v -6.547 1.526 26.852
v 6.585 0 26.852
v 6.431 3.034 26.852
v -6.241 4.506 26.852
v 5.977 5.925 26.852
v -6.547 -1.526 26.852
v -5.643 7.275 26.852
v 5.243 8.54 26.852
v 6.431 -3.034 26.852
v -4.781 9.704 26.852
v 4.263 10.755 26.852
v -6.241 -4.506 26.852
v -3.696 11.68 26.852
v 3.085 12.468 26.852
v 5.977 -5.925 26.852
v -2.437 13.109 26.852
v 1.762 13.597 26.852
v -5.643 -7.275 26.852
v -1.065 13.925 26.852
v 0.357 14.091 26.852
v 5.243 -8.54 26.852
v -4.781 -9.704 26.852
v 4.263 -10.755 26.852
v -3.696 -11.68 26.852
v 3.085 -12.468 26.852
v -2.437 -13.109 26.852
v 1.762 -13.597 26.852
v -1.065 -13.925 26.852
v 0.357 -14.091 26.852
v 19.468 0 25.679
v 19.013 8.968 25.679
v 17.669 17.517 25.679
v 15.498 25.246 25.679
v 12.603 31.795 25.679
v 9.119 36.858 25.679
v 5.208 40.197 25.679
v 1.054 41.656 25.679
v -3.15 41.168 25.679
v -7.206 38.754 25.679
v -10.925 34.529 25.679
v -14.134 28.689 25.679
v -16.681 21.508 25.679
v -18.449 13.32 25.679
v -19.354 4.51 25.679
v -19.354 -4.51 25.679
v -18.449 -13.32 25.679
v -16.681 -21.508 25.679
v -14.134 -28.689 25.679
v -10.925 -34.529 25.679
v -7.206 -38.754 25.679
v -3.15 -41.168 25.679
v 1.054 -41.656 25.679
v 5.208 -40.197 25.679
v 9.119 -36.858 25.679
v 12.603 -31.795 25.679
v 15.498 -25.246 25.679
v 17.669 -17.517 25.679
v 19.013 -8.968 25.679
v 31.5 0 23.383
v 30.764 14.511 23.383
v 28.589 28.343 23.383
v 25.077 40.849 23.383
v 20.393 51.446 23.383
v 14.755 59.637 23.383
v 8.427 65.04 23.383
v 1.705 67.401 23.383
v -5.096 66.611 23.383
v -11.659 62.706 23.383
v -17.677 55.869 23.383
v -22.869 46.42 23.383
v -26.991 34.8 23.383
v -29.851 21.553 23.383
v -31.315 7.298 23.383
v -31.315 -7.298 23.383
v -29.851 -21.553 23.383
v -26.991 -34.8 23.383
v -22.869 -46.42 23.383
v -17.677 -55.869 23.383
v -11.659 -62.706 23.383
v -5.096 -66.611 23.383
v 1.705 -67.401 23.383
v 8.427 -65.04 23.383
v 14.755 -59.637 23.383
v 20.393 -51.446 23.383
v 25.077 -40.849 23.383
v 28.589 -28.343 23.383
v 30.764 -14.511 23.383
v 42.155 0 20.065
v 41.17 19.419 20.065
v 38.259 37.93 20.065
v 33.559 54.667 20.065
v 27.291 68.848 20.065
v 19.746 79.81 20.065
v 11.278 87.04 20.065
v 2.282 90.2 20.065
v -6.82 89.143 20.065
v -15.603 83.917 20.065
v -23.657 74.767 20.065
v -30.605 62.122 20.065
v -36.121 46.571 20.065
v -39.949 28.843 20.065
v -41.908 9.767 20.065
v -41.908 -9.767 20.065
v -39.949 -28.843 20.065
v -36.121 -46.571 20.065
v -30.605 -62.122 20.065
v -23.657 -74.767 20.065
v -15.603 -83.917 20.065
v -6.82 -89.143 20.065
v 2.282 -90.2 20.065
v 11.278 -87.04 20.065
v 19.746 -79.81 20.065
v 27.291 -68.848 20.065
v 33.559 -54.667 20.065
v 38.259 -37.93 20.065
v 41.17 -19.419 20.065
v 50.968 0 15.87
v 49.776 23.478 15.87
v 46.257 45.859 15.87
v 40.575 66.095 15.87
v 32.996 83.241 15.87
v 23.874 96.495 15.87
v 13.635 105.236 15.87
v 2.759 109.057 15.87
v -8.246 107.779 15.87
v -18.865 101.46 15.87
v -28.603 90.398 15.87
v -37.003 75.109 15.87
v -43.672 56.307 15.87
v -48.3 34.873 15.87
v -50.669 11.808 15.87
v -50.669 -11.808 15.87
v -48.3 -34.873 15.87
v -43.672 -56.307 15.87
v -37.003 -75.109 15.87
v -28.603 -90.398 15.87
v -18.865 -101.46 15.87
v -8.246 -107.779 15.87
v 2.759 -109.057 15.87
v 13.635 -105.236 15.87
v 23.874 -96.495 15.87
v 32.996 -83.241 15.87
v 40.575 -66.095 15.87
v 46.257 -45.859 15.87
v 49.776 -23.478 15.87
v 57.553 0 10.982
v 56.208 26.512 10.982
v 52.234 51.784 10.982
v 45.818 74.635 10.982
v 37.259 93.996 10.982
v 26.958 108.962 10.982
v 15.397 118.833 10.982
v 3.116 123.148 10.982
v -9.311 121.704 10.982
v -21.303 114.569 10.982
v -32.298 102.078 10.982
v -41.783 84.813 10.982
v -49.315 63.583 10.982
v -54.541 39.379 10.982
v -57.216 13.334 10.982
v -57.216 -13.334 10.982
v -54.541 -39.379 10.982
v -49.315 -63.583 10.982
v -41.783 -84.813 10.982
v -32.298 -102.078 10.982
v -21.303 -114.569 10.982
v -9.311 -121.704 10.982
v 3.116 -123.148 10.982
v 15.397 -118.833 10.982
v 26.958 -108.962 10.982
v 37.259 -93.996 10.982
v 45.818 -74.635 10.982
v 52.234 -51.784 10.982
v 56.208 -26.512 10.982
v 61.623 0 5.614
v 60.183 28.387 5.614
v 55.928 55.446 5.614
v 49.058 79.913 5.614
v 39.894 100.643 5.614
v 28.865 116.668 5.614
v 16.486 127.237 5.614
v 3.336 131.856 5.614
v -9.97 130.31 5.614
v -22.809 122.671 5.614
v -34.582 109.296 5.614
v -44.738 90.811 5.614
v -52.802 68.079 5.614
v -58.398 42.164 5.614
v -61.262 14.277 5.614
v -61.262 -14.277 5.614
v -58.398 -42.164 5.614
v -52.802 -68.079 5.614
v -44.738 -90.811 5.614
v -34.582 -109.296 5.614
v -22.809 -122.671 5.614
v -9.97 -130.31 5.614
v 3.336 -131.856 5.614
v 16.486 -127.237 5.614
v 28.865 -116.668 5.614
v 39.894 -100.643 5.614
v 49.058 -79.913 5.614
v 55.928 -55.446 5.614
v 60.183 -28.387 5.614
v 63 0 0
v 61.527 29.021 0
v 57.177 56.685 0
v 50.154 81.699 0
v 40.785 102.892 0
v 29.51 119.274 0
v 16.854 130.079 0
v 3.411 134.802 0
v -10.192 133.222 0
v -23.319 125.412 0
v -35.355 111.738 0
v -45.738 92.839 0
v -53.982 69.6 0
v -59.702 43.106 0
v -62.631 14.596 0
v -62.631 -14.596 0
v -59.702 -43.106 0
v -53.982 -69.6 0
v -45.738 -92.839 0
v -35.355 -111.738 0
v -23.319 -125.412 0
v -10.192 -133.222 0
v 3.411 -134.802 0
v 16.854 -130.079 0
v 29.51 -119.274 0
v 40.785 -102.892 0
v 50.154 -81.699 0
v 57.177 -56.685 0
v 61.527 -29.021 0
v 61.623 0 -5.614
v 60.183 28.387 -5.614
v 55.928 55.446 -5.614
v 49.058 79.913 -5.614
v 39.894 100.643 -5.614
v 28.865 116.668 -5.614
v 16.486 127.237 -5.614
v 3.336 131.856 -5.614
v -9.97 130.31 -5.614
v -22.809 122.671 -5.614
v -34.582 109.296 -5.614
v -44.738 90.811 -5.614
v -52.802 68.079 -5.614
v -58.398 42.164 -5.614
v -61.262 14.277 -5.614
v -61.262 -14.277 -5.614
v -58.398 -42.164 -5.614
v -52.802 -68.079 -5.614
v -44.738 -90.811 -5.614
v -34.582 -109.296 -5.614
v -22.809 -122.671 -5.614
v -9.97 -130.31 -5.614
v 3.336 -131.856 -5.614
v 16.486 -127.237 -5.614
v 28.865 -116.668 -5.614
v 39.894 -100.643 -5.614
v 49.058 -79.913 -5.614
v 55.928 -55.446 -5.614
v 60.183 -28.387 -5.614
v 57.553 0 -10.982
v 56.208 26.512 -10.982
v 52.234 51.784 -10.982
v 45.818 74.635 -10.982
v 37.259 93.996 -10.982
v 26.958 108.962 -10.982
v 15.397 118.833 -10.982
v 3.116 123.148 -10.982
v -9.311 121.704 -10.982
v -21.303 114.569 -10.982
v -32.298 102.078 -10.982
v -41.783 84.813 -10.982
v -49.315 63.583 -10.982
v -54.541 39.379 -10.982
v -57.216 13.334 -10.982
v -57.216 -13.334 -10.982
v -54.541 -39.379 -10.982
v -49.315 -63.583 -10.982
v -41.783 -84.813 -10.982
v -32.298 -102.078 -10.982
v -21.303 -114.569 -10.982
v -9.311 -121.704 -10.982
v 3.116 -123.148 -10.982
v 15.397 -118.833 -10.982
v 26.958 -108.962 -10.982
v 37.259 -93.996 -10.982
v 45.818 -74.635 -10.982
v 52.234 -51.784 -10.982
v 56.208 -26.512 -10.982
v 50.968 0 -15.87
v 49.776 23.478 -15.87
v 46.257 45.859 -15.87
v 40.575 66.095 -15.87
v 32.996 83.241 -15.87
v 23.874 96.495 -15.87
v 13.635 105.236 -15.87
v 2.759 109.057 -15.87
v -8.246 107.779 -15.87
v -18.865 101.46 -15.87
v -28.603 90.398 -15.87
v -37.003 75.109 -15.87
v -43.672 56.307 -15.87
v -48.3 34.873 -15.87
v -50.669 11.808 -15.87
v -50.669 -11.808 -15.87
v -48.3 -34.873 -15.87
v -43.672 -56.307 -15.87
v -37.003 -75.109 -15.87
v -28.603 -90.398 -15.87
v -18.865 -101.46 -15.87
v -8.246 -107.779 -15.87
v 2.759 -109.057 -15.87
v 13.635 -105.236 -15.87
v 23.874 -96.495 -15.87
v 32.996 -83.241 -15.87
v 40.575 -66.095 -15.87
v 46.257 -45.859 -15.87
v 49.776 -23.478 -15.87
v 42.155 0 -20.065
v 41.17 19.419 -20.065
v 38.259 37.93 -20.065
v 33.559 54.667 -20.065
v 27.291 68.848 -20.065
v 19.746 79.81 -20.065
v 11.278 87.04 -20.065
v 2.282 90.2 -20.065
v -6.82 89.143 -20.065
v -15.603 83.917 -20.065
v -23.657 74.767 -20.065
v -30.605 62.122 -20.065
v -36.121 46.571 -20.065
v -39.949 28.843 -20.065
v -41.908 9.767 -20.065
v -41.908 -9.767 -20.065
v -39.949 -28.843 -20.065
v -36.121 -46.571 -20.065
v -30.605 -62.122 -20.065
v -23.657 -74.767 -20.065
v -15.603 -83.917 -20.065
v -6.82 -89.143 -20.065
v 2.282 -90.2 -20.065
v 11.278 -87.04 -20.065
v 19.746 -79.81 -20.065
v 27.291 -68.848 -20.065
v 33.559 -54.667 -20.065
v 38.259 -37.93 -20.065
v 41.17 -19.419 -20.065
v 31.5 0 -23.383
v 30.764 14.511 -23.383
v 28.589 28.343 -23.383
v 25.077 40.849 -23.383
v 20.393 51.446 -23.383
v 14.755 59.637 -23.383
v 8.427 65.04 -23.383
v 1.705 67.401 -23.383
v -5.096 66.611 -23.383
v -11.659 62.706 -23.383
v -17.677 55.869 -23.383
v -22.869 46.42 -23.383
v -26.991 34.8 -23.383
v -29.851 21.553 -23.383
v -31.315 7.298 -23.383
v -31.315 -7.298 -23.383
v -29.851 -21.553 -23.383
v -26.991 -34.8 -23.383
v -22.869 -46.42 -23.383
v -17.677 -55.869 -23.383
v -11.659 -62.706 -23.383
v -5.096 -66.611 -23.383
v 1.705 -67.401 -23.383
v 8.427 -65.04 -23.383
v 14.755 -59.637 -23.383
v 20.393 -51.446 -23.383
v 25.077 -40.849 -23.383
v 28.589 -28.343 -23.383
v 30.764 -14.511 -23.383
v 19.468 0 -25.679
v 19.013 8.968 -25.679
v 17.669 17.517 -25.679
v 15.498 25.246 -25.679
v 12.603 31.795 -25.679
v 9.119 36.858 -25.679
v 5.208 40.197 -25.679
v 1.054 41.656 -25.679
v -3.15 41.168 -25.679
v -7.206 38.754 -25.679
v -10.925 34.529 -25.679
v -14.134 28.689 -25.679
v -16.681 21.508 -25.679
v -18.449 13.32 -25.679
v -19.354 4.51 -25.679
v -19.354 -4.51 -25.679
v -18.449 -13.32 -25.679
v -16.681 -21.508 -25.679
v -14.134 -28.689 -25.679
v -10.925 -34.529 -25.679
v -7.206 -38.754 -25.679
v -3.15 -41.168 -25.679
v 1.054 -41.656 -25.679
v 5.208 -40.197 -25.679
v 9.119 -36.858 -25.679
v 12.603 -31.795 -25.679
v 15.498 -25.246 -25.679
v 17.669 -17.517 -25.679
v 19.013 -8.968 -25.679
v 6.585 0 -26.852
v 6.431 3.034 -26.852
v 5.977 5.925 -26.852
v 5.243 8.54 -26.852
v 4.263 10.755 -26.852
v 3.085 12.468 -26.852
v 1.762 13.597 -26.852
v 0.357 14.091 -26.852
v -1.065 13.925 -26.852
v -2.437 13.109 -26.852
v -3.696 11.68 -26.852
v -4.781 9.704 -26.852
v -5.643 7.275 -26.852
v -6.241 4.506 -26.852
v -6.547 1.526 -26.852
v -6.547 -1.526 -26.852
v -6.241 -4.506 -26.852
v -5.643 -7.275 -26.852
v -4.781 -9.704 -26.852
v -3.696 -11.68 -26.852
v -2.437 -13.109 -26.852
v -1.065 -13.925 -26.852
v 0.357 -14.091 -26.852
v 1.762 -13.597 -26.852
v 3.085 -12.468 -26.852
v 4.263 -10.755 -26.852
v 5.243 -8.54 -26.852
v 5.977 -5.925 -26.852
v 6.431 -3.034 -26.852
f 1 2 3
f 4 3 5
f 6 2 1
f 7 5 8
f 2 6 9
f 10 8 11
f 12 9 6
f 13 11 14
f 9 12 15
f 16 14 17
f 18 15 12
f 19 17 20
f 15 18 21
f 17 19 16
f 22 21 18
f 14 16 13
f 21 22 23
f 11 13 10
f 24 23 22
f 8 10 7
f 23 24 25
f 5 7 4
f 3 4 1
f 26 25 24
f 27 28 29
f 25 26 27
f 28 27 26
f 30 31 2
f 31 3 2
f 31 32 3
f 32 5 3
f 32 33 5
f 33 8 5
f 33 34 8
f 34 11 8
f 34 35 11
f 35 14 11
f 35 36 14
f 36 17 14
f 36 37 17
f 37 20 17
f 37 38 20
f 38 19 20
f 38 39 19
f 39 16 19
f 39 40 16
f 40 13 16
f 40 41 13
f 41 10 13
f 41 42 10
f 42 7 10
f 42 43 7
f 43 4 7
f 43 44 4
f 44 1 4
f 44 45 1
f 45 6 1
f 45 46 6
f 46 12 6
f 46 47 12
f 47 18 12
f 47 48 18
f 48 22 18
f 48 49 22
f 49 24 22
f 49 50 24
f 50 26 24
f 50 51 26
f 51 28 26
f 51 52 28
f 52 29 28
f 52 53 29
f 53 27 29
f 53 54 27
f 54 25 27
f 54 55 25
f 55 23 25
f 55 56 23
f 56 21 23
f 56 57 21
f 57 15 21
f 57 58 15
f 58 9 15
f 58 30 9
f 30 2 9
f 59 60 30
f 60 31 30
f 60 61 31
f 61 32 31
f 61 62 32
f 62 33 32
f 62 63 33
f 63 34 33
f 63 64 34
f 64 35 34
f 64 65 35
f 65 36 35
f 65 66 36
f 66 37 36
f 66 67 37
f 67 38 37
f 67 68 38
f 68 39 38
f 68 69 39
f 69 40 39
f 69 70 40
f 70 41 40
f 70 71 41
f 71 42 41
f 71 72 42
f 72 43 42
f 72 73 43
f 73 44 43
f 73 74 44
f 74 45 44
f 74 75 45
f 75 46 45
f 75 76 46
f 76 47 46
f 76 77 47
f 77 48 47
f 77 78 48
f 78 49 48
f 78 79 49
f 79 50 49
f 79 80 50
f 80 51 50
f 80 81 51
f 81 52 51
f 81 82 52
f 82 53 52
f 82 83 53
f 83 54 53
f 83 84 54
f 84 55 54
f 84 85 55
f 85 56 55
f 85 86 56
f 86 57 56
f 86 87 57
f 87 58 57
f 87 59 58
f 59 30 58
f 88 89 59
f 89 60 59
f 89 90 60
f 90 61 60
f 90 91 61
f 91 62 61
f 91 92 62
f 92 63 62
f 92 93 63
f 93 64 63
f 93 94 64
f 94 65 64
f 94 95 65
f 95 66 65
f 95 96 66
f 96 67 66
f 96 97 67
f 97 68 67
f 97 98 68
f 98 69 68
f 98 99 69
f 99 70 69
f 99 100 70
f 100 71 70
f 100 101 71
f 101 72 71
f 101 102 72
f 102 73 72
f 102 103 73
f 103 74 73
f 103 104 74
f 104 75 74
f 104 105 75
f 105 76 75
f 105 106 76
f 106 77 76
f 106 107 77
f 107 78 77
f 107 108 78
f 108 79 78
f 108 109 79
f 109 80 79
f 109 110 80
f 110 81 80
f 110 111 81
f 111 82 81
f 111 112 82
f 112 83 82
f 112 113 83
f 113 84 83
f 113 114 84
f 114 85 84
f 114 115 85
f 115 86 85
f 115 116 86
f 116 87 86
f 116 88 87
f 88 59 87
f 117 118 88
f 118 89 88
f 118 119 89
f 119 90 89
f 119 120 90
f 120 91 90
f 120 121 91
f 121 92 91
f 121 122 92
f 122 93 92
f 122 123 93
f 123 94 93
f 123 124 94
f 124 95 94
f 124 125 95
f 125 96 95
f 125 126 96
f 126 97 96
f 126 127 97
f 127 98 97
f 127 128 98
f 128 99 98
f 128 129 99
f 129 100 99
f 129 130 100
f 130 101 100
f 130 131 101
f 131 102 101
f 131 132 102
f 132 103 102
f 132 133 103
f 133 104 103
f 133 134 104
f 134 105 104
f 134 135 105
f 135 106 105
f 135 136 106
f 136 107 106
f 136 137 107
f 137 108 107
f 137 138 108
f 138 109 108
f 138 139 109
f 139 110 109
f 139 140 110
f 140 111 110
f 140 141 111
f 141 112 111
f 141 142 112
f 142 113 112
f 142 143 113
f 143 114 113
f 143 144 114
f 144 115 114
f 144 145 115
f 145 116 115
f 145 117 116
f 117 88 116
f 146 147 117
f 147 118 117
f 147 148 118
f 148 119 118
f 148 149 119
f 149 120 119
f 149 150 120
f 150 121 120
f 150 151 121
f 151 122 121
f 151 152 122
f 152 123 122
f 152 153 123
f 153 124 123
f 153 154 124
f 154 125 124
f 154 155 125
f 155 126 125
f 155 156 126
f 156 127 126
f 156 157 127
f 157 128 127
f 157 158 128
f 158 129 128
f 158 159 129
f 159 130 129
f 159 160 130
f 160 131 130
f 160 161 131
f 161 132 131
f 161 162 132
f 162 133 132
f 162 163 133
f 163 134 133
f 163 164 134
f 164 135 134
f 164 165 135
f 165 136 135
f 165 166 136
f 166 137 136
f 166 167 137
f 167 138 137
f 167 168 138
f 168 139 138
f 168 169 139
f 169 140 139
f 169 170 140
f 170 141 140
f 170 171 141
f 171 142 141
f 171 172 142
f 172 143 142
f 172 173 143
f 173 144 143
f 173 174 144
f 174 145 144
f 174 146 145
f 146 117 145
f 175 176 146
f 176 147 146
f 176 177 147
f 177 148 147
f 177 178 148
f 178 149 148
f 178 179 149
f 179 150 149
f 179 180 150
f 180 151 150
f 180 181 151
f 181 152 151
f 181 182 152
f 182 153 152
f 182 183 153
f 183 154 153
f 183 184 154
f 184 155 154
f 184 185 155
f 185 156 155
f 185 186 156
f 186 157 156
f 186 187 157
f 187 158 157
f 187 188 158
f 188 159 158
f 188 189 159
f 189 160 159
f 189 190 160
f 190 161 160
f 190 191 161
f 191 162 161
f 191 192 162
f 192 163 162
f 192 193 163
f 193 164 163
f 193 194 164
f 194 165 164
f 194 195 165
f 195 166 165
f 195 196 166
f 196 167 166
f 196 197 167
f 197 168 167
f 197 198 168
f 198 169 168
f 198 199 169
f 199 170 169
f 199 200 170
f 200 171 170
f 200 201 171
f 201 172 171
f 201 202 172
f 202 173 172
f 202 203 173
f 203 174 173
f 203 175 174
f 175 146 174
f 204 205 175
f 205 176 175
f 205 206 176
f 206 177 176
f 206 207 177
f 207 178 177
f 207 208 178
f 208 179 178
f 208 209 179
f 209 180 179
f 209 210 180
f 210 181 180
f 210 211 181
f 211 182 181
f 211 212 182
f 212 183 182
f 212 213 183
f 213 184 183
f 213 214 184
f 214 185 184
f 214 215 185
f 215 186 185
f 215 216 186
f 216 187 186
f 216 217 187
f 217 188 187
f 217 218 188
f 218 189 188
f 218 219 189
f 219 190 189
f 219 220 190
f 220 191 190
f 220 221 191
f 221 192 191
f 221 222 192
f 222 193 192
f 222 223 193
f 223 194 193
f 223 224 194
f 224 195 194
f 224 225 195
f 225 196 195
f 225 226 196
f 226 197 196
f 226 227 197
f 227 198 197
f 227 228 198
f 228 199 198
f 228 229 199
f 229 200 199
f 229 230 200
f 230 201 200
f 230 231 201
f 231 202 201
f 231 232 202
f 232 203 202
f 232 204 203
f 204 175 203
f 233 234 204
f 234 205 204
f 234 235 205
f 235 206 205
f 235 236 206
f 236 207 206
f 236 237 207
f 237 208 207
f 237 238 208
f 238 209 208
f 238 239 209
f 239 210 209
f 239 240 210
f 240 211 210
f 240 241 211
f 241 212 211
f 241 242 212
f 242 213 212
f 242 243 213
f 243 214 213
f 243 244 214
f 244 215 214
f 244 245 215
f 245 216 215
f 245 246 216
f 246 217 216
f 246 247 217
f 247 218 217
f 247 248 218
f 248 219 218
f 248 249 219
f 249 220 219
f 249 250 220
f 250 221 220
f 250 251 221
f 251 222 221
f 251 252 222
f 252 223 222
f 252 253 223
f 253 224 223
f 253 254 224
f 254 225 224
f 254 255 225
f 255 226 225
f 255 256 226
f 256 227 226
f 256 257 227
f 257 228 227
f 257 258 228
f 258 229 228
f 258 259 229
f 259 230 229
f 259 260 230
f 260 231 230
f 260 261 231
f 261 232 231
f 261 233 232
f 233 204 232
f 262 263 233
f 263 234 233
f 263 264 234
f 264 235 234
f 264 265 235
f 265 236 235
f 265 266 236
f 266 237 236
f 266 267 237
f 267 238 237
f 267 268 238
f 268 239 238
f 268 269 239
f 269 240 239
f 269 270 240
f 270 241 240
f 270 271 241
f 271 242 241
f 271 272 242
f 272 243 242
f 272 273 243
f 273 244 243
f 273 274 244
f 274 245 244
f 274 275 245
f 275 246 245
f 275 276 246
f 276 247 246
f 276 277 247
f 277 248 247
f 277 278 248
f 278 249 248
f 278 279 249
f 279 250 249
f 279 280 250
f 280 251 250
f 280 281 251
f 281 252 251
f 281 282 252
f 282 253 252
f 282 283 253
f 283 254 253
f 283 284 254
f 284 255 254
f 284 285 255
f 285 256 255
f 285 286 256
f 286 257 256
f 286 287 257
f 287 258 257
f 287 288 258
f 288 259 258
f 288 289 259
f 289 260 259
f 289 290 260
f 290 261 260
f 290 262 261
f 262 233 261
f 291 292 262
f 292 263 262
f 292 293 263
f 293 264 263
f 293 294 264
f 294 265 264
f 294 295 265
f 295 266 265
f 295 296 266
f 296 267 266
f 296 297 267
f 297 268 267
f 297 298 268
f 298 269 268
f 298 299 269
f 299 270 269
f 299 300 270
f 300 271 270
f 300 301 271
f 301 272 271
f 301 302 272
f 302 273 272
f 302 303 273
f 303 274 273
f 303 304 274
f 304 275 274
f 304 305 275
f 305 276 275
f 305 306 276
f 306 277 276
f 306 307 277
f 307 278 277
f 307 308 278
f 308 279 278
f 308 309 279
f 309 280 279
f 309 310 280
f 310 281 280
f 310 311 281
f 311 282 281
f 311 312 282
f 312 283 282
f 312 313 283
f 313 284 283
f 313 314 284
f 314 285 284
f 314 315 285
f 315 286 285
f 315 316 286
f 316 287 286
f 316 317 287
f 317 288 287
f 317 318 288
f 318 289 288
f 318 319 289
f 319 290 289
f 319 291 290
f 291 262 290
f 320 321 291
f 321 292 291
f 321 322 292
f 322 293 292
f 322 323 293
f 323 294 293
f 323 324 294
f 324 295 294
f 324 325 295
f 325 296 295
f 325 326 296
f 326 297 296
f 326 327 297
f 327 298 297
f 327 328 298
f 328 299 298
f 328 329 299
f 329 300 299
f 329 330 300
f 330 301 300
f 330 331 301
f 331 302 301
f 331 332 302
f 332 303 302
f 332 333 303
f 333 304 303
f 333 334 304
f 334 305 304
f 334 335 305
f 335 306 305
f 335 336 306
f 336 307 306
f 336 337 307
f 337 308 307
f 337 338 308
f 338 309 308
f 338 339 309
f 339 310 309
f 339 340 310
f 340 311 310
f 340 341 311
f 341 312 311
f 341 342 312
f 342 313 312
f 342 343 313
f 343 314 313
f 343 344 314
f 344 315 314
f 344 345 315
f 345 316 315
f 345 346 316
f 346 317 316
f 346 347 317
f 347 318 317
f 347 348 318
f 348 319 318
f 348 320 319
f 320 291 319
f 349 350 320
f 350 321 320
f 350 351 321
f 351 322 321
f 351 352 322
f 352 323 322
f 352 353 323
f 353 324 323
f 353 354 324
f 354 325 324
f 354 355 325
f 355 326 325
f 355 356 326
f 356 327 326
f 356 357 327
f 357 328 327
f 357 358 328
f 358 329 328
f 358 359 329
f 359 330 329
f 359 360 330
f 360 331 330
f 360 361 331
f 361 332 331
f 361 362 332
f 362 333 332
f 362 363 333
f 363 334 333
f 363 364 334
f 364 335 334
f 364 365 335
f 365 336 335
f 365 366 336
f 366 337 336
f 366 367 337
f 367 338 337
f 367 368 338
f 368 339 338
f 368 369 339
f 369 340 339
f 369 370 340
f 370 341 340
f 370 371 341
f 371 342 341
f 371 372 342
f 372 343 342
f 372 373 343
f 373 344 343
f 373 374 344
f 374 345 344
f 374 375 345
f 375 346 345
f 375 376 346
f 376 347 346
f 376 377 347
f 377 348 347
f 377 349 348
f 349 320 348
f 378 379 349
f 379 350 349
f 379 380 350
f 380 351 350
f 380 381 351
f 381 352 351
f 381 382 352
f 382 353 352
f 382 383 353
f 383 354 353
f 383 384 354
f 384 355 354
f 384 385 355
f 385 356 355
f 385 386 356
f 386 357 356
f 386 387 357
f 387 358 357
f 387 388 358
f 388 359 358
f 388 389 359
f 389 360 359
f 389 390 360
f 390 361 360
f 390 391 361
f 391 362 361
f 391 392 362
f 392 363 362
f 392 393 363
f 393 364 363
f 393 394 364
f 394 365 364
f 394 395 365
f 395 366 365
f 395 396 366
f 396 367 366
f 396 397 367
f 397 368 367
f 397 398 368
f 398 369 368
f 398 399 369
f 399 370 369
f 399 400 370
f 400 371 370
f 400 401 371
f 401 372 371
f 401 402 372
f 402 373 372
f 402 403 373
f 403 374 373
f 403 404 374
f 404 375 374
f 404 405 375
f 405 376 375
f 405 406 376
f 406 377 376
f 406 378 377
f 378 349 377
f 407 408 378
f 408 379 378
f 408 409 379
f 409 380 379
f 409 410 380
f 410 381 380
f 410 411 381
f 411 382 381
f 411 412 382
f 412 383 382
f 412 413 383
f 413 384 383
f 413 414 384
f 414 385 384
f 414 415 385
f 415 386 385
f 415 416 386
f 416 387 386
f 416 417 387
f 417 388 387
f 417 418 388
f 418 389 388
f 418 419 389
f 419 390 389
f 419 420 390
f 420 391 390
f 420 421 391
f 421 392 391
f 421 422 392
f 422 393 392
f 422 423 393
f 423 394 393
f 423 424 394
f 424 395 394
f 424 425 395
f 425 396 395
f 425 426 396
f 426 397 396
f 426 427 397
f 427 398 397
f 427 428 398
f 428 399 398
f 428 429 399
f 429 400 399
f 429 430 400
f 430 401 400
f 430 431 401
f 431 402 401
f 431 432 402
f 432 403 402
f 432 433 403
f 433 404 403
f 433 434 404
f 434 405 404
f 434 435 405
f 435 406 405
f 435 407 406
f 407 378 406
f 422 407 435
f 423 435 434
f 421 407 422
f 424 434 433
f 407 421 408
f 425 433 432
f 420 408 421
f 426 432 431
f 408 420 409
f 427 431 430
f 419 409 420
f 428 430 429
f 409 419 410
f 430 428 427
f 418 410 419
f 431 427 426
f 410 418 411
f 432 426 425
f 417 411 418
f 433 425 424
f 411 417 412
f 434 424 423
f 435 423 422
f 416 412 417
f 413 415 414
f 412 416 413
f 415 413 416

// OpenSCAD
// Generated by SolidPython 1.0.1 on 2020-07-29 00:46:47


scale(v = [7, 15, 3]) {
	sphere(r = 9);
}
/***********************************************
*********      SolidPython code:      **********
************************************************
 
# import packages: SolidPython
from solid import *
from solid.utils import *
from itertools import chain, combinations, permutations


class Resize:

    def __init__(self, scad_file):
        self.scad_file = scad_file
        #self.scad_file = import_scad(scad_file)
        # cone/cylinder param:
        self.r1 = 0
        self.r2 = 0
        self.h = 0
        # rectangular prism param:
        self.w = 0
        self.l = 0
        # ellipse param:
        self.r = 0

    # import OpenScad code (file name corresponds to shape)


    # classify shape + parameters
    def assign(self, param1, param2, param3):
        if self.scad_file == 'cone.scad':
            self.r1 = param1
            self.r2 = param2
            self.h = param3
        elif self.scad_file == 'cylinder.scad':
            self.r1 = param1
            self.r2 = param2
            self.h = param3
        elif self.scad_file == 'rectangularPrism.scad':
            self.h = param1
            self.l = param2
            self.w = param3
        else:
            self.r = param1
            self.h = param2

    # resize parameters
    def iterate(self):
        x = range(3, 20, 2)
        i = 1
        if self.scad_file == 'cone.scad':
            tempList = list(permutations(x, 2))
            for temp in tempList:
                param1 = temp[0]
                param2 = temp[1]
                filepath = 'produced_scad_files/' + 'cone' + str(param1) + '_' + str(param2) + '_' + '.scad'
                scad_render_to_file(cylinder(h=param1, r1=param2, r2=0), filepath)

        elif self.scad_file == 'cylinder.scad':
            tempList = list(permutations(x, 3))
            for temp in tempList:
                param1 = temp[0]
                param2 = temp[1]
                filepath = 'produced_scad_files/' + 'cylinder' + str(param1) + '_' + str(param2) + '_' + '.scad'
                scad_render_to_file(cylinder(h=param1, r1=param2, r2=param2), filepath)

        elif self.scad_file == 'rectangularPrism.scad':
            tempList = list(permutations(x, 3))
            for temp in tempList:
                param1 = temp[0]
                param2 = temp[1]
                param3 = temp[2]
                filepath = 'produced_scad_files/' + 'rectangularPrism' + str(param1) + '_' + str(param2) + '_' + str(
                    param3) + '.scad'
                scad_render_to_file(cube(size=(param1, param2, param3)), filepath)

        elif self.scad_file == 'ellipse.scad':
            tempList = list(permutations(x, 4))
            for temp in tempList:
                param1 = temp[0]
                param2 = temp[1]
                param3 = temp[2]
                param4 = temp[3]
                filepath = 'produced_scad_files/' + 'ellipse' + str(param1) + '_' + str(param2) + '_' + str(param3) + '_' + str(param4) + '.scad'
                scad_render_to_file(scale([param1, param2, param3])(sphere(r=param4)), filepath)

    def render_to_scadfile(self):
        scad_render_to_file(scad, 'example.scad') 
 
************************************************/
